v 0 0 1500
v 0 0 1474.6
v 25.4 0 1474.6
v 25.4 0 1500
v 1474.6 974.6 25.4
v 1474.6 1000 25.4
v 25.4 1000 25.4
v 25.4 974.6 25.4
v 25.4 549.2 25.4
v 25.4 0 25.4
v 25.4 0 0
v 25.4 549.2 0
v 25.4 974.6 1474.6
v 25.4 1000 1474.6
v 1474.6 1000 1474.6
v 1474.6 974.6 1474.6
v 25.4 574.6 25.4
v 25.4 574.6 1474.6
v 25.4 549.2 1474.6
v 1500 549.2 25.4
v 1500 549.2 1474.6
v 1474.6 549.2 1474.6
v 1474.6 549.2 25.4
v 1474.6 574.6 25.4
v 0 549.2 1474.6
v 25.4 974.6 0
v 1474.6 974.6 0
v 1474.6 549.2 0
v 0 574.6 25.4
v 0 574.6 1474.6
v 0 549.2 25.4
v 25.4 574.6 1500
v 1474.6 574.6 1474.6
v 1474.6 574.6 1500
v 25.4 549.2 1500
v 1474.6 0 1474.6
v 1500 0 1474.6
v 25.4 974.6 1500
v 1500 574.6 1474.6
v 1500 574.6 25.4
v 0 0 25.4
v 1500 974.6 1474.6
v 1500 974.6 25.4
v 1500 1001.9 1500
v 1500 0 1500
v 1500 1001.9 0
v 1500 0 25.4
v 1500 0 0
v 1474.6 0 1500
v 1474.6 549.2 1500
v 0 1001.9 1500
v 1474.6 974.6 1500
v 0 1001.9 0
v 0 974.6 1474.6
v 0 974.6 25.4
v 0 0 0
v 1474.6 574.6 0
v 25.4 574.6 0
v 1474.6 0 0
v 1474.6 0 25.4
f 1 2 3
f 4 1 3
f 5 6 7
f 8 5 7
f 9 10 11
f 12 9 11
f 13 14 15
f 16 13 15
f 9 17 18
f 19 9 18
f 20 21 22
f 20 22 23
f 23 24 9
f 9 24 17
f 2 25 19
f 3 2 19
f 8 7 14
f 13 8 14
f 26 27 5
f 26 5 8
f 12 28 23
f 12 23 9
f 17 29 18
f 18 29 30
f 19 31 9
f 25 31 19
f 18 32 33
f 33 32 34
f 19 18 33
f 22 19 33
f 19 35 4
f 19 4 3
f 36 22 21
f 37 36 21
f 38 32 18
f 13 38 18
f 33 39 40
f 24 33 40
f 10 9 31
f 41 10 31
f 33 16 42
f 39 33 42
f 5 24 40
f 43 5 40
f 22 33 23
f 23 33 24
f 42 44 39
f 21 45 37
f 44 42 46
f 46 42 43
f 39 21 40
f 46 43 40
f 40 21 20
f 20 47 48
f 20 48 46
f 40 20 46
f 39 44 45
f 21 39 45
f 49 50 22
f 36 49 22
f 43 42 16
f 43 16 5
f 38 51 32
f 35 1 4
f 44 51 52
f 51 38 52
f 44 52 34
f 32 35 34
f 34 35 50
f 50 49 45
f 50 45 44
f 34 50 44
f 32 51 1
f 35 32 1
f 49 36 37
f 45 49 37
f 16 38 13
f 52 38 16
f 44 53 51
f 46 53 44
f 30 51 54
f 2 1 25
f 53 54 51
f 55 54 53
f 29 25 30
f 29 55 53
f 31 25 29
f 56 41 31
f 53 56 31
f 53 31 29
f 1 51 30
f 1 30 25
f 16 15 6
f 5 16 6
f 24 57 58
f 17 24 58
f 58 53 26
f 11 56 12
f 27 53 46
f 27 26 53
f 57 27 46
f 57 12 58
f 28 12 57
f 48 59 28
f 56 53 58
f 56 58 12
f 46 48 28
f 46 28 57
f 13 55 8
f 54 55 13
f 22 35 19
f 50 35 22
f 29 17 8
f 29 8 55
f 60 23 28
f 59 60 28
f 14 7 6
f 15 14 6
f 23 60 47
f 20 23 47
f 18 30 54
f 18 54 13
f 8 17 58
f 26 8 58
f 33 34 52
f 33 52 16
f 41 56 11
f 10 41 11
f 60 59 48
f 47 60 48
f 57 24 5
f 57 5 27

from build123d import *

# Parameters (mm, degrees)
CROQUIS1_W                = 25.4
CROQUIS1_H                = 25.4
SALIENTE_EXTRUIR1_DEPTH   = 1000
SALIENTE_EXTRUIR1_2_DEPTH = 1000
SALIENTE_EXTRUIR1_3_DEPTH = 1000
SALIENTE_EXTRUIR1_4_DEPTH = 1000
CROQUIS3_W                = 1449.2
CROQUIS3_H                = 25.4
SALIENTE_EXTRUIR2_DEPTH   = 25.4
CROQUIS4_W                = 1449.2
CROQUIS4_H                = 25.4
SALIENTE_EXTRUIR3_DEPTH   = 25.4
CROQUIS5_W                = 1449.2
CROQUIS5_H                = 25.4
SALIENTE_EXTRUIR4_DEPTH   = 25.4
CROQUIS6_W                = 1449.2
CROQUIS6_H                = 25.4
SALIENTE_EXTRUIR5_DEPTH   = 25.4
CROQUIS7_W                = 1500
CROQUIS7_H                = 1500
SALIENTE_EXTRUIR6_DEPTH   = 1.9


with BuildPart() as part:
    # Croquis1 → Saliente-Extruir1 (new body)
    with BuildSketch(Plane(origin=(0, 0, 0), x_dir=(1, 0, 0), z_dir=(0, 1, 0))):
        with Locations((12.7, -12.7)):
            Rectangle(CROQUIS1_W, CROQUIS1_H)
    extrude(amount=SALIENTE_EXTRUIR1_DEPTH)



with BuildPart() as body_2:
    # Croquis1 → Saliente-Extruir1 2 (new body)
    with BuildSketch(Plane(origin=(0, 0, 0), x_dir=(1, 0, 0), z_dir=(0, 1, 0))):
        with Locations((1487.3, -12.7)):
            Rectangle(CROQUIS1_W, CROQUIS1_H)
    extrude(amount=SALIENTE_EXTRUIR1_2_DEPTH)



with BuildPart() as body_3:
    # Croquis1 → Saliente-Extruir1 3 (new body)
    with BuildSketch(Plane(origin=(0, 0, 0), x_dir=(1, 0, 0), z_dir=(0, 1, 0))):
        with Locations((1487.3, -1487.3)):
            Rectangle(CROQUIS1_W, CROQUIS1_H)
    extrude(amount=SALIENTE_EXTRUIR1_3_DEPTH)



with BuildPart() as body_4:
    # Croquis1 → Saliente-Extruir1 4 (new body)
    with BuildSketch(Plane(origin=(0, 0, 0), x_dir=(1, 0, 0), z_dir=(0, 1, 0))):
        with Locations((12.7, -1487.3)):
            Rectangle(CROQUIS1_W, CROQUIS1_H)
    extrude(amount=SALIENTE_EXTRUIR1_4_DEPTH)


with BuildPart() as body_3_1:
    add(body_3.part)

    add(body_4.part)  # Saliente-Extruir2 merges body 4
    # Croquis3 → Saliente-Extruir2 (add)
    with BuildSketch(Plane.XY.offset(1500)):
        with Locations((750, 987.3)):
            Rectangle(CROQUIS3_W, CROQUIS3_H)
        with Locations((750, 561.9)):
            Rectangle(CROQUIS3_W, CROQUIS3_H)
    extrude(amount=-SALIENTE_EXTRUIR2_DEPTH)


with BuildPart() as body_2_1:
    add(body_2.part)

    add(body_3_1.part)  # Saliente-Extruir3 merges body 3
    # Croquis4 → Saliente-Extruir3 (add)
    with BuildSketch(Plane(origin=(1500, 0, 0), x_dir=(0, 0, -1), z_dir=(1, 0, 0))):
        with Locations((-750, 987.3)):
            Rectangle(CROQUIS4_W, CROQUIS4_H)
        with Locations((-750, 561.9)):
            Rectangle(CROQUIS4_W, CROQUIS4_H)
    extrude(amount=-SALIENTE_EXTRUIR3_DEPTH)


with BuildPart() as part_1:
    add(part.part)

    add(body_2_1.part)  # Saliente-Extruir4 merges body 2
    # Croquis5 → Saliente-Extruir4 (add)
    with BuildSketch(Plane(origin=(0, 0, 0), x_dir=(-1, 0, 0), z_dir=(0, 0, -1))):
        with Locations((-750, 987.3)):
            Rectangle(CROQUIS5_W, CROQUIS5_H)
        with Locations((-750, 561.9)):
            Rectangle(CROQUIS5_W, CROQUIS5_H)
    extrude(amount=-SALIENTE_EXTRUIR4_DEPTH)

    # Croquis6 → Saliente-Extruir5 (add)
    with BuildSketch(Plane.ZY):
        with Locations((750, 987.3)):
            Rectangle(CROQUIS6_W, CROQUIS6_H)
        with Locations((750, 561.9)):
            Rectangle(CROQUIS6_W, CROQUIS6_H)
    extrude(amount=-SALIENTE_EXTRUIR5_DEPTH)

    # Croquis7 → Saliente-Extruir6 (add)
    with BuildSketch(Plane(origin=(0, 1000, 0), x_dir=(1, 0, 0), z_dir=(0, 1, 0))):
        with Locations((750, -750)):
            Rectangle(CROQUIS7_W, CROQUIS7_H)
    extrude(amount=SALIENTE_EXTRUIR6_DEPTH)


solid = part_1.part
